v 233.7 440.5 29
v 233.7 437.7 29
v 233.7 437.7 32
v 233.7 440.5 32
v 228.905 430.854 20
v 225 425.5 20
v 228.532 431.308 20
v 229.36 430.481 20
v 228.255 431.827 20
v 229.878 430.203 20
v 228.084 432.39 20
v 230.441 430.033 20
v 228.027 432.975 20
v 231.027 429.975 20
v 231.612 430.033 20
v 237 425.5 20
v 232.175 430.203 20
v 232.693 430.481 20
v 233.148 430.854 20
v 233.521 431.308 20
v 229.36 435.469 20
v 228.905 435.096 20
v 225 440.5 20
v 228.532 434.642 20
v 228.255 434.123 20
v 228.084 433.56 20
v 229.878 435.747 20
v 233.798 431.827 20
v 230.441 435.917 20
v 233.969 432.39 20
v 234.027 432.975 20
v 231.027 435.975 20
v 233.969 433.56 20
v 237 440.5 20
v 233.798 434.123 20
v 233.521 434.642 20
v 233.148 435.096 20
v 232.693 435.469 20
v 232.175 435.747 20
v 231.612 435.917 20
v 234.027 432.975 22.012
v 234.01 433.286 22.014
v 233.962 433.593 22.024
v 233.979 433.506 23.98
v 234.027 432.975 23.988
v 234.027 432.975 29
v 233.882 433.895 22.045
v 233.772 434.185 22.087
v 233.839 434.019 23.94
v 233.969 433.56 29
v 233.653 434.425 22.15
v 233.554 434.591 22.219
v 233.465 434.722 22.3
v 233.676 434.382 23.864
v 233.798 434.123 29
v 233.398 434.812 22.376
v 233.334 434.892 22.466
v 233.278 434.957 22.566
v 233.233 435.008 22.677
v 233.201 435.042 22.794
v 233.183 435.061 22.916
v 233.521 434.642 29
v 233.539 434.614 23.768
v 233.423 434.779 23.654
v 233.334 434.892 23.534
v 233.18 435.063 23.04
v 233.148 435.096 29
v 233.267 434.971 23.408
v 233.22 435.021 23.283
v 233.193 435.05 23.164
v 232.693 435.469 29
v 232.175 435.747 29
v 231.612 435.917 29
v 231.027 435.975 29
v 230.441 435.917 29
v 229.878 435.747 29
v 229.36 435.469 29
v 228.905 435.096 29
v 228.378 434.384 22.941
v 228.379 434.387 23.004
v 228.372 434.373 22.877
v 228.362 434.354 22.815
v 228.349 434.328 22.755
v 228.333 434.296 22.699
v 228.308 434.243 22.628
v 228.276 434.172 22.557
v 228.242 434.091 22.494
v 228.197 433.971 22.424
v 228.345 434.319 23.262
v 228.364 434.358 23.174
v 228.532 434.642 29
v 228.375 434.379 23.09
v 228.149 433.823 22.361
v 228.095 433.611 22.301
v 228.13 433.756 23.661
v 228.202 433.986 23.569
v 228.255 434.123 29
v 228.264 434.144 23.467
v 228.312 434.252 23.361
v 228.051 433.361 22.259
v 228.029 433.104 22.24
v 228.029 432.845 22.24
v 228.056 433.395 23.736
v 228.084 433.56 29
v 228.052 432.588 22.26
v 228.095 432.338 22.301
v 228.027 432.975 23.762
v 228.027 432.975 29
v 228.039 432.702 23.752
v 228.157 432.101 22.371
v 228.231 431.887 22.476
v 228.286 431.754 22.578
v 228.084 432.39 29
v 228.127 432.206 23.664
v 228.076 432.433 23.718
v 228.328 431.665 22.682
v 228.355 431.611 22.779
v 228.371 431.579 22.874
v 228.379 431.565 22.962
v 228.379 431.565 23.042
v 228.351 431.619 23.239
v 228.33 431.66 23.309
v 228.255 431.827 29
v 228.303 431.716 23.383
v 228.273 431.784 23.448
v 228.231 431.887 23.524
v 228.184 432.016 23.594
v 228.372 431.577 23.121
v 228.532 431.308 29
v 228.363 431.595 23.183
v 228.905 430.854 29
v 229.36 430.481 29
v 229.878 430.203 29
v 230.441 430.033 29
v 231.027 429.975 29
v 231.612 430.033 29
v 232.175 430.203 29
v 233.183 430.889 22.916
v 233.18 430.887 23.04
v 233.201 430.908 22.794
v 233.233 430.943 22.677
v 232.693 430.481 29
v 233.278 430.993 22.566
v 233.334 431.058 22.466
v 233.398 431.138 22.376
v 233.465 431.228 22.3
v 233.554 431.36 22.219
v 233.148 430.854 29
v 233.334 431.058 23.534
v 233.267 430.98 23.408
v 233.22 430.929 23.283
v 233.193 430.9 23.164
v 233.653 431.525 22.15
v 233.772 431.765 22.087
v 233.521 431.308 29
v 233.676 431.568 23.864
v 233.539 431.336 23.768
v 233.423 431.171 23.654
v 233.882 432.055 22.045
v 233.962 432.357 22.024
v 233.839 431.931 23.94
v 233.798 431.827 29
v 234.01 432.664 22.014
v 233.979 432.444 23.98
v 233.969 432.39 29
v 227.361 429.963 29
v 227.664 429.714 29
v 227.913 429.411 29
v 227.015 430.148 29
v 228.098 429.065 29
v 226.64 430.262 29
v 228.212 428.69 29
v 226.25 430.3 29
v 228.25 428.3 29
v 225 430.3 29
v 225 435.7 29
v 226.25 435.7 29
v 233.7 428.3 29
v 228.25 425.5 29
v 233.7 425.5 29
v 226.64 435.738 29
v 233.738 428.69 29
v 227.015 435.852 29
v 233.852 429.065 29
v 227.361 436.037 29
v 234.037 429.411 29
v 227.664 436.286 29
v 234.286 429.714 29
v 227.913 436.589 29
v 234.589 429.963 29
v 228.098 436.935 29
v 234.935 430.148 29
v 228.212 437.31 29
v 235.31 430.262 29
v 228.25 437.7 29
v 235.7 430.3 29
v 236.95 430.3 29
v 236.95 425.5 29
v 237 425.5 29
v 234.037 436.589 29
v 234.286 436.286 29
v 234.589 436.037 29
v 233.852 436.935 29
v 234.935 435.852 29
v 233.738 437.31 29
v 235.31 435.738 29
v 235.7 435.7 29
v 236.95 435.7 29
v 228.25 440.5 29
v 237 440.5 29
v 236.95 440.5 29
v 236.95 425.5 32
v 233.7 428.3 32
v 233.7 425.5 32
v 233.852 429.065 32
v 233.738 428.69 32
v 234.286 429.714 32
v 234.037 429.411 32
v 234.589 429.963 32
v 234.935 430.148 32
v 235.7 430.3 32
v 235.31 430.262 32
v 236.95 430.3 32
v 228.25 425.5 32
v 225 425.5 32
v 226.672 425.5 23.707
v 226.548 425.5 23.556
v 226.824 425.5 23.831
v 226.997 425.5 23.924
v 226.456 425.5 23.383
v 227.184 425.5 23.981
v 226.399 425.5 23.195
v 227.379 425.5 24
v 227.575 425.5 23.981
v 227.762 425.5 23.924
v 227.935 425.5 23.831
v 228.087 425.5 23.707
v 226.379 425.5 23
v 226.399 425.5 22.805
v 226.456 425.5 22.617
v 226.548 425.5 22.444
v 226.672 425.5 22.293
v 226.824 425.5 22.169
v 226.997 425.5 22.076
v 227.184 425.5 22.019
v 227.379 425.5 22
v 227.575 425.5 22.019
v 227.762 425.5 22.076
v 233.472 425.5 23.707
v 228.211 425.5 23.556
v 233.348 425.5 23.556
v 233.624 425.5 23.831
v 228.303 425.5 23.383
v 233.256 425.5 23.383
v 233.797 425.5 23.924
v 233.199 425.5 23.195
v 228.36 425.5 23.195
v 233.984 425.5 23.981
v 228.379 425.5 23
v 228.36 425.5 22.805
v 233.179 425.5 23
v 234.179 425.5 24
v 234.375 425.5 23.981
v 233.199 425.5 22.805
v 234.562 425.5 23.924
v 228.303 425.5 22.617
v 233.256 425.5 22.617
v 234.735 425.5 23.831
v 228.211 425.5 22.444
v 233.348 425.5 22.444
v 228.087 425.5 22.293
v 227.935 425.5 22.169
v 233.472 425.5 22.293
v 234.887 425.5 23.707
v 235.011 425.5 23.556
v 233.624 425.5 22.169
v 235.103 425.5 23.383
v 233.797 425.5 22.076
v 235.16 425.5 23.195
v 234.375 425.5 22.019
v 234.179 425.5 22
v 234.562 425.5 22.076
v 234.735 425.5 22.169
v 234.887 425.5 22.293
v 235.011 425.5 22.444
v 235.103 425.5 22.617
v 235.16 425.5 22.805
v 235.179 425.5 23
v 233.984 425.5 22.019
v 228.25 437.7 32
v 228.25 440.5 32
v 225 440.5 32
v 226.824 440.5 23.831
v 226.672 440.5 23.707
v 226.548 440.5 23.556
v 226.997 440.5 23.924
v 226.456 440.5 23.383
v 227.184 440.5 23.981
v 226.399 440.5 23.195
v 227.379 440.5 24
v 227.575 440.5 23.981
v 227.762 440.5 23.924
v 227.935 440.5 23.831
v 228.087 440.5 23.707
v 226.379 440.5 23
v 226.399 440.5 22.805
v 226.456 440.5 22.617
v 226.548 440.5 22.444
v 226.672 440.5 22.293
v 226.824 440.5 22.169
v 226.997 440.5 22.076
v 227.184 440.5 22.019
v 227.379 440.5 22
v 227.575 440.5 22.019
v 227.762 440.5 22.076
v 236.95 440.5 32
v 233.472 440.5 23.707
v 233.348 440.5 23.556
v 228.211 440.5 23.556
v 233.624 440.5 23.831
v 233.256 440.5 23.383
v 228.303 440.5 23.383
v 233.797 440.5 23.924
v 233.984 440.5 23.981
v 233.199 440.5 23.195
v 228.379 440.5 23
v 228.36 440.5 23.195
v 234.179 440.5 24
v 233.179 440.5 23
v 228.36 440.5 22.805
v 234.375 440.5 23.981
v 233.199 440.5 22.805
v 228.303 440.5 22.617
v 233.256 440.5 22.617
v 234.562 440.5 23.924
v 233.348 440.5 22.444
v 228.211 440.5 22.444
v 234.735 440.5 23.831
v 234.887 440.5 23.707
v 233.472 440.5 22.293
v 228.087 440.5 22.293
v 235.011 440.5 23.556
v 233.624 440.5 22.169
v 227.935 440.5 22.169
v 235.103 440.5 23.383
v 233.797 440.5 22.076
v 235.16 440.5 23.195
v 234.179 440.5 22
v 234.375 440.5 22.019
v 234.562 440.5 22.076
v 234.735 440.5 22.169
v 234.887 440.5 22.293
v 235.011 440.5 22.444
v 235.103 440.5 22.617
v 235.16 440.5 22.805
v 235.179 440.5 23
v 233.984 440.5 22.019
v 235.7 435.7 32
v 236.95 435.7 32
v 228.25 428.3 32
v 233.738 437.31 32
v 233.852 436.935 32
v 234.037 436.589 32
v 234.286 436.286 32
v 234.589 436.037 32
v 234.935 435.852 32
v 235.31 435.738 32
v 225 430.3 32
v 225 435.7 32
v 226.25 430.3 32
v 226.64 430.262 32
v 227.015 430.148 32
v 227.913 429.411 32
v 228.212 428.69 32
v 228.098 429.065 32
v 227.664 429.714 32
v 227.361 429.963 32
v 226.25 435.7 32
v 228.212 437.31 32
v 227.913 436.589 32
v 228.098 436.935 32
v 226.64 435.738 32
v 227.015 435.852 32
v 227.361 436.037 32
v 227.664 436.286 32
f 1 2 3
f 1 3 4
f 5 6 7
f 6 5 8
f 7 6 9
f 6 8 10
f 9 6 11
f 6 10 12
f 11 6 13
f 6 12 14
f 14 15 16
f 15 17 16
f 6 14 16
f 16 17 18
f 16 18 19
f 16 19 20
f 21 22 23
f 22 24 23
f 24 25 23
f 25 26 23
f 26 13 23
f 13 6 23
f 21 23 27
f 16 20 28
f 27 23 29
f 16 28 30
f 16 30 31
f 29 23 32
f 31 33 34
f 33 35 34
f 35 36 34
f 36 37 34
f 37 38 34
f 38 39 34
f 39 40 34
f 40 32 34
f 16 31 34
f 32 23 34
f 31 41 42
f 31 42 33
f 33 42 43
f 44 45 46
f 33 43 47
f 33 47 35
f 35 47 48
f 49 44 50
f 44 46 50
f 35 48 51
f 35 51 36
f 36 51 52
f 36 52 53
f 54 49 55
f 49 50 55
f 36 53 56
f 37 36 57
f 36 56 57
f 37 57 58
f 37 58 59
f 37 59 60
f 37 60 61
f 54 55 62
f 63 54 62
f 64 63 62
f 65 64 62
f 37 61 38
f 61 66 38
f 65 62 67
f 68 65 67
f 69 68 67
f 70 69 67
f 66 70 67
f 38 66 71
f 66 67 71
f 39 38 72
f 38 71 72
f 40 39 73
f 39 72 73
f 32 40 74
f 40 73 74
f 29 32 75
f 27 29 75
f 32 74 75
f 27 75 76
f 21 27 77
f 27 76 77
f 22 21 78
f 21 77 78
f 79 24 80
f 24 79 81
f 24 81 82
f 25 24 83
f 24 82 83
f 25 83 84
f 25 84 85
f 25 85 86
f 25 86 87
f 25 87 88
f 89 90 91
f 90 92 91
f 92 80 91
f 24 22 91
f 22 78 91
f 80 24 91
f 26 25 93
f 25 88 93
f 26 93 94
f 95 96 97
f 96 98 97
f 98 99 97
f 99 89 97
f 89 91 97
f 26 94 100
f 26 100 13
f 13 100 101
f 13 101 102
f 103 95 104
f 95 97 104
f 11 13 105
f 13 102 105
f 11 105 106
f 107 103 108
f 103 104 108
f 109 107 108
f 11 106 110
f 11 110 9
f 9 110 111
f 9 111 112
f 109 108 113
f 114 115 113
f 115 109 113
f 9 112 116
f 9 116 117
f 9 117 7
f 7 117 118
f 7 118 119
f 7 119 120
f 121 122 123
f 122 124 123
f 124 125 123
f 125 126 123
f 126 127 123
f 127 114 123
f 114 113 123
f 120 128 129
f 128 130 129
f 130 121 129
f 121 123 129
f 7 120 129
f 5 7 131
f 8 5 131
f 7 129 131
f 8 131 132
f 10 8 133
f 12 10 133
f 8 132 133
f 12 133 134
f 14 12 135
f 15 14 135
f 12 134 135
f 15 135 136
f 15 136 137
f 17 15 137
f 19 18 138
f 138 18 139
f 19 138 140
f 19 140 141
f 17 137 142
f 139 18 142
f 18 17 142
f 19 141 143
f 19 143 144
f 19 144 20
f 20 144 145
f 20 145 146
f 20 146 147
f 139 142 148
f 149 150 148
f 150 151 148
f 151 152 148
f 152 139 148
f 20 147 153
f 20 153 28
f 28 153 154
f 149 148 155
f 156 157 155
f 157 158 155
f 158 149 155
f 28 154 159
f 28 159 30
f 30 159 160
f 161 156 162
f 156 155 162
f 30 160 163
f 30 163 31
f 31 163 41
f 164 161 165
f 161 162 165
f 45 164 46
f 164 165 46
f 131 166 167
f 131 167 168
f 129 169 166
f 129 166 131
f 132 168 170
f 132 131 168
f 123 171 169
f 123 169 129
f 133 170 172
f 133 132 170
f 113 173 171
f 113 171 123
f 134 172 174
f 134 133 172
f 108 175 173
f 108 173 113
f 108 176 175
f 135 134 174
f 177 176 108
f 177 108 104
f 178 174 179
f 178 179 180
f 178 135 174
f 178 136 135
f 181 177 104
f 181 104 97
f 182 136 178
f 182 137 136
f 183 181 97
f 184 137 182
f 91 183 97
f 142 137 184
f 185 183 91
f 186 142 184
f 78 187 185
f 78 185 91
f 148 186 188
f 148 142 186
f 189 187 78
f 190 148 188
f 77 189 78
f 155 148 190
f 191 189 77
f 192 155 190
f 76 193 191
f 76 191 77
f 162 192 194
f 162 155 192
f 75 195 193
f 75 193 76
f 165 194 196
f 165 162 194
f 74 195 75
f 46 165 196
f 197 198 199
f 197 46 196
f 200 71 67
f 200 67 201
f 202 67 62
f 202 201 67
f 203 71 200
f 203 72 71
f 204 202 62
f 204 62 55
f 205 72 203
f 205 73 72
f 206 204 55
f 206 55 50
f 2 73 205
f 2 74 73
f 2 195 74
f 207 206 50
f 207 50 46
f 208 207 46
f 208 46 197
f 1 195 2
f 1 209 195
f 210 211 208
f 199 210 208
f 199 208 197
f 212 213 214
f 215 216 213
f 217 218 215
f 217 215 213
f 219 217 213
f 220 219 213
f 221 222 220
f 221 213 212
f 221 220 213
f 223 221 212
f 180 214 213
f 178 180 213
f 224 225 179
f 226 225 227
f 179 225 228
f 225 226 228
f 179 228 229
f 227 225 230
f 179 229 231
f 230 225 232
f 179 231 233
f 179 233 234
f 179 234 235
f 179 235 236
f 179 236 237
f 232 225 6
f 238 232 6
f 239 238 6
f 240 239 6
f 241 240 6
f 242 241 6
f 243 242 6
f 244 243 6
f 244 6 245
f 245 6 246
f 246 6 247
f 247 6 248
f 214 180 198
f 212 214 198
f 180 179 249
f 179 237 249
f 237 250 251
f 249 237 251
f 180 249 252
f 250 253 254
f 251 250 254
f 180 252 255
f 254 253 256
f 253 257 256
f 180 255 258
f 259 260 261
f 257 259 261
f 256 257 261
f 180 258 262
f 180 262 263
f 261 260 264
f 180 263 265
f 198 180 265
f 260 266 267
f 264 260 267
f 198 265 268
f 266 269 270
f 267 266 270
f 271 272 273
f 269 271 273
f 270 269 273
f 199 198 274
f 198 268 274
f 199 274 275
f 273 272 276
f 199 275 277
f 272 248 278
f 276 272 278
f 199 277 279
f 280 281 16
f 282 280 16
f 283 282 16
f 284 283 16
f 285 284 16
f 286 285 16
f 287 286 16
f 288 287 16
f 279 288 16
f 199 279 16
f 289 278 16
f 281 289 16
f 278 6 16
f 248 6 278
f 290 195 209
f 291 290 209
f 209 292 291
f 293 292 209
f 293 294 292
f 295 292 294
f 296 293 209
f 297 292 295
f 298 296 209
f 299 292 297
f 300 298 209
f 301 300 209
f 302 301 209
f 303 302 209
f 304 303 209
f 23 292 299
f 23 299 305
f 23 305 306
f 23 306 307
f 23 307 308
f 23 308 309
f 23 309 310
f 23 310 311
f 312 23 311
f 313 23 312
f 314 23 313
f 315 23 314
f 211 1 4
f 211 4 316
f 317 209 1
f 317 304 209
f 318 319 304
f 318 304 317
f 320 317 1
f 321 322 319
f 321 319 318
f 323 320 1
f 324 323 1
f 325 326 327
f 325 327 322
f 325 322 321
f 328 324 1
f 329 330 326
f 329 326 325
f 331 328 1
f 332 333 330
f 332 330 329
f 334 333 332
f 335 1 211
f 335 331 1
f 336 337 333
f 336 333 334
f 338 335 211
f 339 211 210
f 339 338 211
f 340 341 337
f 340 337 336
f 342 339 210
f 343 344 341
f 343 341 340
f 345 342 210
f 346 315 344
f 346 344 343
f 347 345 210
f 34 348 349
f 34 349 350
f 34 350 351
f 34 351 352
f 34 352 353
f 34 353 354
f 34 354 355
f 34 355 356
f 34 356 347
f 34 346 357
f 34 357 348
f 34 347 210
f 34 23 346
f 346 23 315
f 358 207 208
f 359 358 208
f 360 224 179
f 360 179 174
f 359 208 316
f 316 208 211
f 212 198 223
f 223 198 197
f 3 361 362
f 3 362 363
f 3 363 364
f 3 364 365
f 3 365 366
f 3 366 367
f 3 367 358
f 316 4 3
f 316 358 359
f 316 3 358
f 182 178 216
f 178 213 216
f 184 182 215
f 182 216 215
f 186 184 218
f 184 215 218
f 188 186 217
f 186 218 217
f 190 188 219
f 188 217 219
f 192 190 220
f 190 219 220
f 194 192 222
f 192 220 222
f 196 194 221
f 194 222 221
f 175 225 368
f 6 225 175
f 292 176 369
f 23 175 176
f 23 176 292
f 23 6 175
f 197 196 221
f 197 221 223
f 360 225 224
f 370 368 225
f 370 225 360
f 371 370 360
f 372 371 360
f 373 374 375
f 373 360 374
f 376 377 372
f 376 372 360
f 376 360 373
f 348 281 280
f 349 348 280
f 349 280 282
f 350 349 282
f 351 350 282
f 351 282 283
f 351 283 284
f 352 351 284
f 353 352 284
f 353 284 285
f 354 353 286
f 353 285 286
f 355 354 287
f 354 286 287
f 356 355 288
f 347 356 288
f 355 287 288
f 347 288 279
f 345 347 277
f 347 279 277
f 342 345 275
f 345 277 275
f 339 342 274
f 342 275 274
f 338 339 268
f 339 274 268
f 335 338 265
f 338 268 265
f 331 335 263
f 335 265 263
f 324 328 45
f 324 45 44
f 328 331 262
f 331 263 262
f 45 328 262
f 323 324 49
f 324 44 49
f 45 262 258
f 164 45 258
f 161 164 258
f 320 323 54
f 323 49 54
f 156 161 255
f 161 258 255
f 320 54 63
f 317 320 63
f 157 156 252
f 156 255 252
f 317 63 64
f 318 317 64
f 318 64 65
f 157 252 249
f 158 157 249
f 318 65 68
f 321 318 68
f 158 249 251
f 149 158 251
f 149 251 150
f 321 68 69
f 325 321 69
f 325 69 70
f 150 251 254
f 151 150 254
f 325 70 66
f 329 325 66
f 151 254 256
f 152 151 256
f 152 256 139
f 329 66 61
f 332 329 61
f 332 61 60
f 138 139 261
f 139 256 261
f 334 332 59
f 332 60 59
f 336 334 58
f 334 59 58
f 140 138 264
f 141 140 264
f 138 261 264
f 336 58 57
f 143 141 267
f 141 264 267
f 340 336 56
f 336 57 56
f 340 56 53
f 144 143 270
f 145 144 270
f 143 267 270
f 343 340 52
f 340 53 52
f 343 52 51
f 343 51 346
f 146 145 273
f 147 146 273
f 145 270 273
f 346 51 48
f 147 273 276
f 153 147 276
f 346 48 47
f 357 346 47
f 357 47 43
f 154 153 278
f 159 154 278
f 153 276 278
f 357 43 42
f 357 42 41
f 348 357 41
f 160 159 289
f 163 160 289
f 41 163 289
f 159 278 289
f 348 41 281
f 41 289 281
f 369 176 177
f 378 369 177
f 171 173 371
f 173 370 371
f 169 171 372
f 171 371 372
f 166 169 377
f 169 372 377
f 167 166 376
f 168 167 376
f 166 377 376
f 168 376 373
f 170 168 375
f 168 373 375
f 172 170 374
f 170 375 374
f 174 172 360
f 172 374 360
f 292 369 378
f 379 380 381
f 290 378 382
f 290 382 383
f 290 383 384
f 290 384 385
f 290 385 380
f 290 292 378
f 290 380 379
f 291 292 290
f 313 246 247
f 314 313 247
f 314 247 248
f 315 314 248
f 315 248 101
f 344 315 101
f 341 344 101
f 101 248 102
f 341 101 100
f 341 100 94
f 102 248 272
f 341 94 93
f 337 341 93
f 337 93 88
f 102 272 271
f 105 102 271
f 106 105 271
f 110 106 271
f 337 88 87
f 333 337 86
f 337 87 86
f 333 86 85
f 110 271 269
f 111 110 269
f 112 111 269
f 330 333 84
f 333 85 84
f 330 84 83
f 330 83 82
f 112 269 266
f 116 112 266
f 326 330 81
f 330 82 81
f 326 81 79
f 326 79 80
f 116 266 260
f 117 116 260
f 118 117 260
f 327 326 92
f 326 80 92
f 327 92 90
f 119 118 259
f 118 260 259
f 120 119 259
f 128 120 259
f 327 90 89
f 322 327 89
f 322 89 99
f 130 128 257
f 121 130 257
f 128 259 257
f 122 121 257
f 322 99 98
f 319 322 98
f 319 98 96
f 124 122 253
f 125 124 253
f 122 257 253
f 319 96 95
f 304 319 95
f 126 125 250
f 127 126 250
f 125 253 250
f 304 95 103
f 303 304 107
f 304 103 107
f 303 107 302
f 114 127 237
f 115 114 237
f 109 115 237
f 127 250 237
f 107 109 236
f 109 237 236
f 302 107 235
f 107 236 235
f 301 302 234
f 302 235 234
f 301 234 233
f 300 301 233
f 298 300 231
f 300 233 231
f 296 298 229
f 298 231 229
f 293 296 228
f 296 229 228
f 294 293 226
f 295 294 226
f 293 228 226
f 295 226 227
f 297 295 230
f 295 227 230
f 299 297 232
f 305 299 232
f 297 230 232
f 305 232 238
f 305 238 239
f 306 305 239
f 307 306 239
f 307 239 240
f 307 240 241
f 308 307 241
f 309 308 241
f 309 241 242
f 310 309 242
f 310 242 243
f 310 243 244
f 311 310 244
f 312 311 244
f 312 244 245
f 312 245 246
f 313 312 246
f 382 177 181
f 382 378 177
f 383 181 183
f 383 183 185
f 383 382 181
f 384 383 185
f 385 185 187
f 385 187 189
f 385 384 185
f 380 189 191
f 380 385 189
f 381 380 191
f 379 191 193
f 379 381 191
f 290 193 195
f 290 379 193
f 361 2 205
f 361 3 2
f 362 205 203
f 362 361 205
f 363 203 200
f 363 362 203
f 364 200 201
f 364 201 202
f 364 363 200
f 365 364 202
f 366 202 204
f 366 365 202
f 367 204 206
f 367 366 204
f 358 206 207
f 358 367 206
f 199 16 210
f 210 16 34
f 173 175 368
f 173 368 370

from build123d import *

# Parameters (mm, degrees)
SKETCH1_W           = 12
SKETCH1_H           = 15
BOSS_EXTRUDE1_DEPTH = 9
SKETCH2_W           = 3.25
SKETCH2_H           = 4.8
BOSS_EXTRUDE2_DEPTH = 3
SKETCH3_R           = 3
CUT_EXTRUDE1_DEPTH  = 501.290165804
FILLET1_R           = 2
SKETCH4_R           = 1
CUT_EXTRUDE2_DEPTH  = 15


with BuildPart() as part:
    # Sketch1 → Boss-Extrude1 (new body)
    with BuildSketch(Plane.XY.offset(20)):
        with Locations((231, 433)):
            Rectangle(SKETCH1_W, SKETCH1_H)
    extrude(amount=BOSS_EXTRUDE1_DEPTH)

    # Sketch2 → Boss-Extrude2 (add)
    with BuildSketch(Plane.XY.offset(29)):
        with Locations((235.325, 438.1)):
            Rectangle(SKETCH2_W, SKETCH2_H)
        with Locations((226.625, 438.1)):
            Rectangle(SKETCH2_W, SKETCH2_H)
        with Locations((235.325, 427.9)):
            Rectangle(SKETCH2_W, SKETCH2_H)
        with Locations((226.625, 427.9)):
            Rectangle(SKETCH2_W, SKETCH2_H)
    extrude(amount=BOSS_EXTRUDE2_DEPTH)

    # Sketch3 → Cut-Extrude1 (cut, through all)
    with BuildSketch(Plane.XY.offset(29)):
        with Locations((231.026544884, 432.975080758)):
            Circle(SKETCH3_R)
    extrude(amount=-CUT_EXTRUDE1_DEPTH, mode=Mode.SUBTRACT)

    # Fillet1
    fillet1_edges = [part.edges().sort_by_distance(p)[0] for p in [
        (228.25, 435.7, 30.5),
        (233.7, 435.7, 30.5),
        (233.7, 430.3, 30.5),
        (228.25, 430.3, 30.5),
    ]]
    fillet(fillet1_edges, radius=FILLET1_R)

    # Sketch4 → Cut-Extrude2 (cut)
    with BuildSketch(Plane(origin=(0, 425.5, 0), x_dir=(-1, 0, 0), z_dir=(0, -1, 0))):
        with Locations(Location((-227.379453892, -23, 0), (0, 0, 90))):
            Circle(SKETCH4_R)
        with Locations(Location((-234.179453892, -23, 0), (0, 0, 90))):
            Circle(SKETCH4_R)
    extrude(amount=-CUT_EXTRUDE2_DEPTH, mode=Mode.SUBTRACT)


solid = part.part
